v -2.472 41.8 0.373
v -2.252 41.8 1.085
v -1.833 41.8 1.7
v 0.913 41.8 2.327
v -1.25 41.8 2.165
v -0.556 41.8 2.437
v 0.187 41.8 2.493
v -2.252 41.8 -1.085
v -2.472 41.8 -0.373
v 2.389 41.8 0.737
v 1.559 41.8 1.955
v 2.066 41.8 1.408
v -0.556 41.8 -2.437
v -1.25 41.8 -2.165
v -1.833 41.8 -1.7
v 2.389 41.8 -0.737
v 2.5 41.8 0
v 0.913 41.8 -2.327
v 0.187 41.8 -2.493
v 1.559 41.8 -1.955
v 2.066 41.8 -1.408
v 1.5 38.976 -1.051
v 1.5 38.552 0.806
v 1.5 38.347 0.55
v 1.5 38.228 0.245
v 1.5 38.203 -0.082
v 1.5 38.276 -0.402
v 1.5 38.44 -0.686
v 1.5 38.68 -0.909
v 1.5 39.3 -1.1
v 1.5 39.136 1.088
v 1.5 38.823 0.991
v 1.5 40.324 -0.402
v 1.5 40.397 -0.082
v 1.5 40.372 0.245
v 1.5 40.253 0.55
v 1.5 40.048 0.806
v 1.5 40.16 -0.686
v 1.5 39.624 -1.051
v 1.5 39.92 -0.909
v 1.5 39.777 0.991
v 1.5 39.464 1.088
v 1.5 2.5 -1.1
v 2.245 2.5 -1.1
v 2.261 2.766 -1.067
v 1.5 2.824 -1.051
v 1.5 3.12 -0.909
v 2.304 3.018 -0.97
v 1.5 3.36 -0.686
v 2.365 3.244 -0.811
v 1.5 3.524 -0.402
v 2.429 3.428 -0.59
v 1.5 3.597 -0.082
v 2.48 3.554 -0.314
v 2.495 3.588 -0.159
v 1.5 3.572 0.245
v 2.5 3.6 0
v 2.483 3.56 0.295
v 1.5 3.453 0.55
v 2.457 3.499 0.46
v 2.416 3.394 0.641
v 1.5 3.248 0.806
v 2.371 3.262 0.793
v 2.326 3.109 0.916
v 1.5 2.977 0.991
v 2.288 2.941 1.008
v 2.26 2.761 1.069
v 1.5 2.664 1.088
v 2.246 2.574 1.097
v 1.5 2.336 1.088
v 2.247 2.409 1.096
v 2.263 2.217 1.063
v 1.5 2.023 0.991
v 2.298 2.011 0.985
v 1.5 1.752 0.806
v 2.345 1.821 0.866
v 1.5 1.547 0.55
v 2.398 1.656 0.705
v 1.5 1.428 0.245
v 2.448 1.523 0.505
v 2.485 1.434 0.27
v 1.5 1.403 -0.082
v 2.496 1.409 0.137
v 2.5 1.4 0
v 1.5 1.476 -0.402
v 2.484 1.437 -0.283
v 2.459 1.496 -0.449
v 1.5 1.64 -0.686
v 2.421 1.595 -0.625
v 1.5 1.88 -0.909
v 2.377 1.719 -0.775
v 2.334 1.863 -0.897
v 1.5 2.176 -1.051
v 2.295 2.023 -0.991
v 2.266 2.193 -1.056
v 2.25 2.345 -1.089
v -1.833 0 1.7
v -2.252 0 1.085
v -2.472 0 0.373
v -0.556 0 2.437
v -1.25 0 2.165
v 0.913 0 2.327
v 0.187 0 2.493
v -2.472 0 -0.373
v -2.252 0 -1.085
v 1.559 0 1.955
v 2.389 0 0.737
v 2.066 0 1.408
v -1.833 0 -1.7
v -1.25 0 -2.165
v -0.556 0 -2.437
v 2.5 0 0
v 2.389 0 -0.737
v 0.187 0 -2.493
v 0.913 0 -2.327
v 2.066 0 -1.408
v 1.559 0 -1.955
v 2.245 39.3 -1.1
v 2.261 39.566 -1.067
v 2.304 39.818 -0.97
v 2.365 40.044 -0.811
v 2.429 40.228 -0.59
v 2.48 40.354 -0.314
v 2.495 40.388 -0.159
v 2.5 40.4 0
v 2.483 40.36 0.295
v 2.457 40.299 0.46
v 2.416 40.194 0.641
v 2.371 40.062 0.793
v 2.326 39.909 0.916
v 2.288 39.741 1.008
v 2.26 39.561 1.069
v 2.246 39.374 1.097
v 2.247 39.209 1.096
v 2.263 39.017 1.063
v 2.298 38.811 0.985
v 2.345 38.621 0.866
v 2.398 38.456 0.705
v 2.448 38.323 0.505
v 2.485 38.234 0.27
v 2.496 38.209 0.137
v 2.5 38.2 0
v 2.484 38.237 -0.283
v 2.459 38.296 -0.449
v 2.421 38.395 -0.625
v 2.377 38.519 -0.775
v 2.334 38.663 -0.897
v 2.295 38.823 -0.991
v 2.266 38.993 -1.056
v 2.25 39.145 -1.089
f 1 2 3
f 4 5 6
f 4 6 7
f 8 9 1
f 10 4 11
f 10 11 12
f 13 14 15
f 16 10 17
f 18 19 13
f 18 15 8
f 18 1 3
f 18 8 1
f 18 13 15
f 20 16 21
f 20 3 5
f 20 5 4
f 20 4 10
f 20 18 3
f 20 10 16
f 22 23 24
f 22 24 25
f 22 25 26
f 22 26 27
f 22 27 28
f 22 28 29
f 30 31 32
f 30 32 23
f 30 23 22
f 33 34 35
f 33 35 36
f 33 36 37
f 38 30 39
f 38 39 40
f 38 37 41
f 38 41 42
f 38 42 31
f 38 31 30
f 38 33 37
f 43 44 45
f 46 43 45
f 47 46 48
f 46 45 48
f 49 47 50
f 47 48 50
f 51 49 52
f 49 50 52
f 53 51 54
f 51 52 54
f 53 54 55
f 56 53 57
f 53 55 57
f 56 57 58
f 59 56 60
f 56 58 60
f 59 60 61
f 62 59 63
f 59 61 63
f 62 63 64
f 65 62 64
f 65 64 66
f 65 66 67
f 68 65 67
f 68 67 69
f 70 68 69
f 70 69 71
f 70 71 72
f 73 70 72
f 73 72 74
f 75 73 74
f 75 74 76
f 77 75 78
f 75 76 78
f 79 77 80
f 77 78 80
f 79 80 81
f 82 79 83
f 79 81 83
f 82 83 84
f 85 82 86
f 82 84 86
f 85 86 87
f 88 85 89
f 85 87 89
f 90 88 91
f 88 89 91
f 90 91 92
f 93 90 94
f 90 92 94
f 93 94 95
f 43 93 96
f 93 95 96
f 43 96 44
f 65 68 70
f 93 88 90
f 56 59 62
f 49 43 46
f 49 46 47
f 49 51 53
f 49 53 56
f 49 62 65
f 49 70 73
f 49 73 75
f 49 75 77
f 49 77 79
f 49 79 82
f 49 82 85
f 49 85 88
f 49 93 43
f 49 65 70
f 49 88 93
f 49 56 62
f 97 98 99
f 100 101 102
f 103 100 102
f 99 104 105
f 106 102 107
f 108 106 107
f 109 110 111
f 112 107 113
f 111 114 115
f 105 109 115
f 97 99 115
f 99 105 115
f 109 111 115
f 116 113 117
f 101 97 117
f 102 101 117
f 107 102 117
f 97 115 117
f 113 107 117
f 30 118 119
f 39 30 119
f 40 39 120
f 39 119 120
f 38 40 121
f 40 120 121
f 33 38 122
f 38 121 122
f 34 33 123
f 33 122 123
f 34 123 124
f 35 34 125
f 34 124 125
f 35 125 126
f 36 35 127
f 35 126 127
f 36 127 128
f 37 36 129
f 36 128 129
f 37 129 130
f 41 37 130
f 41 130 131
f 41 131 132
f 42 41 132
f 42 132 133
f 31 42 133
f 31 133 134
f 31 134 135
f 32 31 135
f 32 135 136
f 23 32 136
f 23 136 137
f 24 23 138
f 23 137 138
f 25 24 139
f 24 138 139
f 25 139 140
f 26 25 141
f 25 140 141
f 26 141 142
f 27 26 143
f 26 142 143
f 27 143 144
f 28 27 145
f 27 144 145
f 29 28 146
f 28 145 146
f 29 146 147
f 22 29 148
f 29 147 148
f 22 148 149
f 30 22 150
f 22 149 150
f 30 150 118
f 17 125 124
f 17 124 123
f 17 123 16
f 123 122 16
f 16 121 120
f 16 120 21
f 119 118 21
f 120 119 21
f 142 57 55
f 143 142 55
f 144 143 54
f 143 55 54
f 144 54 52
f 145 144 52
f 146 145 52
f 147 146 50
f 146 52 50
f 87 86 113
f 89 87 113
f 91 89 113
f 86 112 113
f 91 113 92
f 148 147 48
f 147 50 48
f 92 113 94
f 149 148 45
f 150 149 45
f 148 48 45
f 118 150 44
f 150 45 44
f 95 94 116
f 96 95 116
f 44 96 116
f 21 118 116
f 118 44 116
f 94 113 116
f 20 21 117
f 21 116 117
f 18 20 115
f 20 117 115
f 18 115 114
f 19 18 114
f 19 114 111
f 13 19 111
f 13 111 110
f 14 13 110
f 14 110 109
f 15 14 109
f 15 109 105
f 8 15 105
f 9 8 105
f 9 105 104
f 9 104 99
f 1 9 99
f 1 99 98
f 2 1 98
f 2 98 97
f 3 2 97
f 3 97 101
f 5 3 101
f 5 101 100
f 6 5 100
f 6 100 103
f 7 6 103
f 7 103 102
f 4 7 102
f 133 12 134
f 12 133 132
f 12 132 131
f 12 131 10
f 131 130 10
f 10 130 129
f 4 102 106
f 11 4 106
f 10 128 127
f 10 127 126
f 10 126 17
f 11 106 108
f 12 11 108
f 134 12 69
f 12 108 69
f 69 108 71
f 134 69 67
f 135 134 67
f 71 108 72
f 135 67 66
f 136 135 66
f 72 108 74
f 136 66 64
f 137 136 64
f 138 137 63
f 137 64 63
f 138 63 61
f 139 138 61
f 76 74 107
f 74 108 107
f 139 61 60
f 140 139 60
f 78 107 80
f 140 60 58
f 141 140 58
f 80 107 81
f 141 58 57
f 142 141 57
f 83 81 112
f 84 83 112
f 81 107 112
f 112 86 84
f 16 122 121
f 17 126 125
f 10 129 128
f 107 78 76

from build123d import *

# Parameters (mm, degrees)
SKETCH_1_R          = 2.5
EXTRUDE_1_DEPTH     = 41.8
SKETCH_6_R          = 1.1
CUT_EXTRUDE_1_DEPTH = 1


with BuildPart() as part:
    # 草图1 → 凸台-拉伸1 (new body)
    with BuildSketch(Plane(origin=(0, 0, 0), x_dir=(1, 0, 0), z_dir=(0, 1, 0))):
        Circle(SKETCH_1_R)
    extrude(amount=EXTRUDE_1_DEPTH)

    # 草图6 → 切除-拉伸1 (cut)
    with BuildSketch(Plane(origin=(2.5, 0, 0), x_dir=(0, 0, -1), z_dir=(1, 0, 0))):
        with Locations((0, 39.3)):
            Circle(SKETCH_6_R)
        with Locations((0, 2.5)):
            Circle(SKETCH_6_R)
    extrude(amount=-CUT_EXTRUDE_1_DEPTH, mode=Mode.SUBTRACT)


solid = part.part
